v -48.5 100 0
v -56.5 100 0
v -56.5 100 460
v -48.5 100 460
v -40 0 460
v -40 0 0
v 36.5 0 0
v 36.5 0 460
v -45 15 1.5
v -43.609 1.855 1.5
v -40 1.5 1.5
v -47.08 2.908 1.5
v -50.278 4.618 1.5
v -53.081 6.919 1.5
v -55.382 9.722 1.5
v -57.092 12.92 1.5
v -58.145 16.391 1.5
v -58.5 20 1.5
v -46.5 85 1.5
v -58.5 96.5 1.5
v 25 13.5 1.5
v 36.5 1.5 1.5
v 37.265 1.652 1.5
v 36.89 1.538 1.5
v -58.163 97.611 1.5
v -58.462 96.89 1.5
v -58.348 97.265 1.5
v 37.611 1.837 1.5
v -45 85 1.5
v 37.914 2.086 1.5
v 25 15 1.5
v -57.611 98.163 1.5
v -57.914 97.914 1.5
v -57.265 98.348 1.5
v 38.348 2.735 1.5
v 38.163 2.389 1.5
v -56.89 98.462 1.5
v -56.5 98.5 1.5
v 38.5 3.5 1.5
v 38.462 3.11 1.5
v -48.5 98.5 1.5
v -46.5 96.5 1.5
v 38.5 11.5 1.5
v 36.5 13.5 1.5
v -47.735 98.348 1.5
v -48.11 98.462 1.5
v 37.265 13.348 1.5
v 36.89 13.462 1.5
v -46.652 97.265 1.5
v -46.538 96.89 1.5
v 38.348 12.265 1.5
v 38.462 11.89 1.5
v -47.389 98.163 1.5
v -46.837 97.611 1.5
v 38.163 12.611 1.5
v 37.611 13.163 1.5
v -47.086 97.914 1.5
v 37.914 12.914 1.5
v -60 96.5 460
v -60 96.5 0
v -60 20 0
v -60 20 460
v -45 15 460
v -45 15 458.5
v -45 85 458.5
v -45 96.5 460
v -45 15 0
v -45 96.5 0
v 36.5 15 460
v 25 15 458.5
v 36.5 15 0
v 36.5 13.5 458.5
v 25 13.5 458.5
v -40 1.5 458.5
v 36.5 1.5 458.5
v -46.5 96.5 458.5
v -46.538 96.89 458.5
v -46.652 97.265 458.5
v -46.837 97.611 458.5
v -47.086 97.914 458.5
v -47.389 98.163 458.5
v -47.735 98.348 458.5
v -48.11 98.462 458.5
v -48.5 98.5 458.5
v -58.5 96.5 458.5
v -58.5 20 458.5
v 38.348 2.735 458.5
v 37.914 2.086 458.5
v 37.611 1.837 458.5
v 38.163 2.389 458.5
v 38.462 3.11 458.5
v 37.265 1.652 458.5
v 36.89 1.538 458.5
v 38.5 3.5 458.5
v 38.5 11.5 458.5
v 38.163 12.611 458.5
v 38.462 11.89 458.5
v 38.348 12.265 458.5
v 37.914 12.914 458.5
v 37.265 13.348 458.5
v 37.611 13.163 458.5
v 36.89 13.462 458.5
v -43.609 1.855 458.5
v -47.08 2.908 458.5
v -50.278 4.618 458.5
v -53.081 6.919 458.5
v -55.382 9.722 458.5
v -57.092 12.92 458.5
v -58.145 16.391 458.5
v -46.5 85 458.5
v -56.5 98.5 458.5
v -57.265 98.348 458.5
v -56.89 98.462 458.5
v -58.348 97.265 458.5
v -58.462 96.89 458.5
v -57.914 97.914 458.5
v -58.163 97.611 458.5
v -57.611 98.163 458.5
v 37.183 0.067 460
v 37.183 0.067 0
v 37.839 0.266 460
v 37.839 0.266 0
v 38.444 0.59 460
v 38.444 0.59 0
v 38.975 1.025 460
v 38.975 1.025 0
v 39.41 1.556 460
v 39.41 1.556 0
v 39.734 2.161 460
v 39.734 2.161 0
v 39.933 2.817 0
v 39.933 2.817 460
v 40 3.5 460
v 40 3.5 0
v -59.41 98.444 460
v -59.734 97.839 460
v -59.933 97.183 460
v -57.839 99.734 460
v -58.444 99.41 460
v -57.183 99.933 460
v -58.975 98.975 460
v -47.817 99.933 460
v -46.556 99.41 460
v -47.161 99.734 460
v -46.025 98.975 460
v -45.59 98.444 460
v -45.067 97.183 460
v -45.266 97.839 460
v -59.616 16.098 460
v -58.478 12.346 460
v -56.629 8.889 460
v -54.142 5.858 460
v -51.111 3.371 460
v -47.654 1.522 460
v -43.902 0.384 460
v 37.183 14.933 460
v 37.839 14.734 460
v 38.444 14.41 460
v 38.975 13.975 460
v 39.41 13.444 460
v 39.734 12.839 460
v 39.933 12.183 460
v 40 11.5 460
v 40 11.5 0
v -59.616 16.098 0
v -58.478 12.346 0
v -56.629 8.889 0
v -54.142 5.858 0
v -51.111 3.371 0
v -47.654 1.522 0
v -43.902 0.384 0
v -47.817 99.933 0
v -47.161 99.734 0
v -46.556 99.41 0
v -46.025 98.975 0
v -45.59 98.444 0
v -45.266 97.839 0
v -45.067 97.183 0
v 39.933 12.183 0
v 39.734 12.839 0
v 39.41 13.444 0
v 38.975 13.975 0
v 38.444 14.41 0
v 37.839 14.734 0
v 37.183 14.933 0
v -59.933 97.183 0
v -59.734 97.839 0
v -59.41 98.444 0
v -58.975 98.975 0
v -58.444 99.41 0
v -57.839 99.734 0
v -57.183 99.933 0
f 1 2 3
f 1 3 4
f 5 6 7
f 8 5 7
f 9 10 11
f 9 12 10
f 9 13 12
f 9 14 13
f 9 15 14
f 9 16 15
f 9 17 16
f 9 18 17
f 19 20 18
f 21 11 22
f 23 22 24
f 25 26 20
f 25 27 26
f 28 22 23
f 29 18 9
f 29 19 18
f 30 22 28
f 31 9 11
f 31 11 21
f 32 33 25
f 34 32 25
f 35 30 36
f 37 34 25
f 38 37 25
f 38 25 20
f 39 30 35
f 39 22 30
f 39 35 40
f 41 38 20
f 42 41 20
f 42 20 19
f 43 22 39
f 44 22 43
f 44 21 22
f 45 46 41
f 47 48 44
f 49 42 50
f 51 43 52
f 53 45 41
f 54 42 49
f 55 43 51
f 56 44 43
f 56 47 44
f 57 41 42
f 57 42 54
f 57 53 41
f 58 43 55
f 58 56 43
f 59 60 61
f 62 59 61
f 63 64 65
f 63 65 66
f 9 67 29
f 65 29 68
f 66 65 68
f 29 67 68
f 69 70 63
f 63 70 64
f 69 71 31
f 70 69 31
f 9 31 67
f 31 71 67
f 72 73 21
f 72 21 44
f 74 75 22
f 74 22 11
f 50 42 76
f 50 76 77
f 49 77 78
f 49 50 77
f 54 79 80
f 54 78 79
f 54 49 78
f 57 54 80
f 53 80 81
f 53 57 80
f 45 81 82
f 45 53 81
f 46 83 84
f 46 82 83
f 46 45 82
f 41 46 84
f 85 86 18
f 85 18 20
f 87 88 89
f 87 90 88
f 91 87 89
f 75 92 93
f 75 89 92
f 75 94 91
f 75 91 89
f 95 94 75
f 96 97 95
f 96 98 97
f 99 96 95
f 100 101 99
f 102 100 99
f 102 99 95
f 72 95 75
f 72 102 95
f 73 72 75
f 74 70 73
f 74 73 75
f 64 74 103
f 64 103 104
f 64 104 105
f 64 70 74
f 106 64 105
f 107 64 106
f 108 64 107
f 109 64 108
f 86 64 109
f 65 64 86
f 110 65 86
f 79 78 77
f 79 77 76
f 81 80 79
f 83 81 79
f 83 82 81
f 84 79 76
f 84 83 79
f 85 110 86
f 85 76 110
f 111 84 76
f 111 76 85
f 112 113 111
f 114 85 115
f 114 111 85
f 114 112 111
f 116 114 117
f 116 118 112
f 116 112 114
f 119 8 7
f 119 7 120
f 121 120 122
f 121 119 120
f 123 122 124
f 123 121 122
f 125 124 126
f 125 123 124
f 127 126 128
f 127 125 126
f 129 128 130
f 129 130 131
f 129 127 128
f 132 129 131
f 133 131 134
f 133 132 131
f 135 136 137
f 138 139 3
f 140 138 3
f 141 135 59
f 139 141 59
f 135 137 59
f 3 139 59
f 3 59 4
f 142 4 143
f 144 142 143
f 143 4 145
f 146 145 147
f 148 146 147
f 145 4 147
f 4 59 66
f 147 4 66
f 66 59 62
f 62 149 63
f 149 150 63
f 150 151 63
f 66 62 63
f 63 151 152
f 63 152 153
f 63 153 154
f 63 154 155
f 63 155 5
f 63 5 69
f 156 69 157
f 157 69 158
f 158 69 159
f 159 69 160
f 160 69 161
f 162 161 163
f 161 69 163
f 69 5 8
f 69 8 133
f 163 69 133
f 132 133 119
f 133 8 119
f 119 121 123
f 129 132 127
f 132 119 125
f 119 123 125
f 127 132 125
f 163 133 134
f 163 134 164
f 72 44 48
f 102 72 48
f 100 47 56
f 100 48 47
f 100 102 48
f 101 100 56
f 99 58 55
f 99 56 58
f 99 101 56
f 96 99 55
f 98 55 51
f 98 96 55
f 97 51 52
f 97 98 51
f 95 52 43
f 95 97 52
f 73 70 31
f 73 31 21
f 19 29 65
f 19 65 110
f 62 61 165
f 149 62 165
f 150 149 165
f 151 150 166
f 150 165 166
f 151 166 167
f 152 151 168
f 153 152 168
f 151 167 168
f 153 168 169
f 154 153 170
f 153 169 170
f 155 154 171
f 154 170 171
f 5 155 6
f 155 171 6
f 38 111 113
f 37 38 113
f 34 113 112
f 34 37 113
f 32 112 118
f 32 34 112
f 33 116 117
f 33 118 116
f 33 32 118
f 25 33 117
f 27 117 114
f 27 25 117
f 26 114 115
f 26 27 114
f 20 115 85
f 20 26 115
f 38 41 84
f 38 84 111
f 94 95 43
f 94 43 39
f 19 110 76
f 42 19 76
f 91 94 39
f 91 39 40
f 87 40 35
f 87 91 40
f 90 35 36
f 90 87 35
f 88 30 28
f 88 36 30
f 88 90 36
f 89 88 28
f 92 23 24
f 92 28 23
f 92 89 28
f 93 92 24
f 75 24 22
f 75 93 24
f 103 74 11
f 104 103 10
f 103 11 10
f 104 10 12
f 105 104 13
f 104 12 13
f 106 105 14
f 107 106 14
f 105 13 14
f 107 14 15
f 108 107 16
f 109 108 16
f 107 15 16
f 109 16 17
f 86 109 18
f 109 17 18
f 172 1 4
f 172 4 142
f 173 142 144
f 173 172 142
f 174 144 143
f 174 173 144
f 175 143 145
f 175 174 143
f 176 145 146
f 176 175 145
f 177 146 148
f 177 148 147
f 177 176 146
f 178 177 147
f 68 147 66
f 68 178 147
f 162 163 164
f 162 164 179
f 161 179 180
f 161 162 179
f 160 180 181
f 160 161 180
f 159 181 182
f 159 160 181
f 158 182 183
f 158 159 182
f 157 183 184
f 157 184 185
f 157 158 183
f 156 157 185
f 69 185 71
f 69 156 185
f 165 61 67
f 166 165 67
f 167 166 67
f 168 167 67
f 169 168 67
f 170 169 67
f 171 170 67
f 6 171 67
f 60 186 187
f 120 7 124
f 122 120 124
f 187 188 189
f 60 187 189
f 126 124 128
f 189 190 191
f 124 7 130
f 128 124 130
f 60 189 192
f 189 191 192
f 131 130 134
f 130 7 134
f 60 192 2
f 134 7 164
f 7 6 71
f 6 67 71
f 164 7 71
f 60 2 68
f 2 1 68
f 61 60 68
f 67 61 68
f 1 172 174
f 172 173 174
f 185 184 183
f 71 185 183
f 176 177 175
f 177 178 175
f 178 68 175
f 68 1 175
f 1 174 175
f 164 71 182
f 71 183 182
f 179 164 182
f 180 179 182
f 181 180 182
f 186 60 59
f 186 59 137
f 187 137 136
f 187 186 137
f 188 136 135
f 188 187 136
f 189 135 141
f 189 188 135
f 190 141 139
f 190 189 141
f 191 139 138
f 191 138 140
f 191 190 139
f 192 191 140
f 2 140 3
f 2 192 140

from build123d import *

# Parameters (mm, degrees)
SM_BASE_FLANGE_1_DEPTH             = 460
SM_EDGE_FLANGE_1_STRIP_W           = 10
SM_EDGE_FLANGE_1_STRIP_H           = 1.5
SM_EDGE_FLANGE_1_STRIP_CUT_DEPTH   = 460
SM_EDGE_FLANGE_1_STRIP_2_W         = 10
SM_EDGE_FLANGE_1_STRIP_2_H         = 1.5
SM_EDGE_FLANGE_1_STRIP_CUT_2_DEPTH = 460
SM_EDGE_FLANGE_1_DEPTH             = 460
SM_EDGE_FLANGE_1_BEND_DEPTH        = 460
SM_EDGE_FLANGE_2_STRIP_W           = 10
SM_EDGE_FLANGE_2_STRIP_H           = 1.5
SM_EDGE_FLANGE_2_STRIP_CUT_DEPTH   = 460
SM_EDGE_FLANGE_2_STRIP_2_W         = 10
SM_EDGE_FLANGE_2_STRIP_2_H         = 1.5
SM_EDGE_FLANGE_2_STRIP_CUT_2_DEPTH = 460
SM_EDGE_FLANGE_2_DEPTH             = 460
SM_EDGE_FLANGE_2_BEND_DEPTH        = 460
EXTRUDE_START                      = -1.5
EXTRUDE_1_DEPTH                    = 1.5
EXTRUDE_2_DEPTH                    = 1.5


# Sheet-metal steps are written as plain solids
with BuildPart() as part:
    # 草图1 → 基体-法兰1 (new body)
    with BuildSketch(Plane.XY):
        with BuildLine():
            Line((-60, 100), (-60, 20))
            ThreePointArc((-60, 20), (-54.142135624, 5.857864376), (-40, 0))
            Line((-40, 0), (40, 0))
            Line((40, 0), (40, 1.5))
            Line((40, 1.5), (-40, 1.5))
            ThreePointArc((-40, 1.5), (-53.081475452, 6.918524548), (-58.5, 20))
            Line((-58.5, 20), (-58.5, 100))
            Line((-58.5, 100), (-60, 100))
        make_face()
    extrude(amount=SM_BASE_FLANGE_1_DEPTH)

    # 边线-法兰1 strip (across the edge) → 边线-法兰1 strip cut (cut)
    with BuildSketch(Plane(origin=(40, 1.5, 460), x_dir=(-1, 0, 0), z_dir=(0, 0, -1))):
        with Locations((-1.5, -0.75)):
            Rectangle(SM_EDGE_FLANGE_1_STRIP_W, SM_EDGE_FLANGE_1_STRIP_H)
    extrude(amount=SM_EDGE_FLANGE_1_STRIP_CUT_DEPTH, mode=Mode.SUBTRACT)

    # 边线-法兰1 strip 2 (across the edge) → 边线-法兰1 strip cut 2 (cut)
    with BuildSketch(Plane(origin=(-58.5, 100, 0), x_dir=(0, -1, 0), z_dir=(0, 0, 1))):
        with Locations((-1.5, -0.75)):
            Rectangle(SM_EDGE_FLANGE_1_STRIP_2_W, SM_EDGE_FLANGE_1_STRIP_2_H)
    extrude(amount=SM_EDGE_FLANGE_1_STRIP_CUT_2_DEPTH, mode=Mode.SUBTRACT)

    # 边线-法兰1 section (across the edge) → 边线-法兰1 (add)
    with BuildSketch(Plane(origin=(40, 1.5, 460), x_dir=(-1, 0, 0), z_dir=(0, 0, -1))):
        with BuildLine():
            Line((0, 2), (0, 13.5))
            Line((0, 13.5), (1.5, 13.5))
            Line((1.5, 13.5), (1.5, 2))
            ThreePointArc((1.5, 2), (2.085786438, 0.585786438), (3.5, 0))
            Line((3.5, 0), (3.5, -1.5))
            ThreePointArc((3.5, -1.5), (1.025126266, -0.474873734), (0, 2))
        make_face()
    extrude(amount=SM_EDGE_FLANGE_1_DEPTH)

    # 边线-法兰1 section 2 (across the edge) → 边线-法兰1 bend (add)
    with BuildSketch(Plane(origin=(-58.5, 100, 0), x_dir=(0, -1, 0), z_dir=(0, 0, 1))):
        with BuildLine():
            Line((0, 2), (0, 13.5))
            Line((0, 13.5), (1.5, 13.5))
            Line((1.5, 13.5), (1.5, 2))
            ThreePointArc((1.5, 2), (2.085786438, 0.585786438), (3.5, 0))
            Line((3.5, 0), (3.5, -1.5))
            ThreePointArc((3.5, -1.5), (1.025126266, -0.474873734), (0, 2))
        make_face()
    extrude(amount=SM_EDGE_FLANGE_1_BEND_DEPTH)

    # 边线-法兰2 strip (across the edge) → 边线-法兰2 strip cut (cut)
    with BuildSketch(Plane(origin=(38.5, 15, 460), x_dir=(0, -1, 0), z_dir=(0, 0, -1))):
        with Locations((-1.5, -0.75)):
            Rectangle(SM_EDGE_FLANGE_2_STRIP_W, SM_EDGE_FLANGE_2_STRIP_H)
    extrude(amount=SM_EDGE_FLANGE_2_STRIP_CUT_DEPTH, mode=Mode.SUBTRACT)

    # 边线-法兰2 strip 2 (across the edge) → 边线-法兰2 strip cut 2 (cut)
    with BuildSketch(Plane(origin=(-45, 98.5, 0), x_dir=(-1, 0, 0), z_dir=(0, 0, 1))):
        with Locations((-1.5, -0.75)):
            Rectangle(SM_EDGE_FLANGE_2_STRIP_2_W, SM_EDGE_FLANGE_2_STRIP_2_H)
    extrude(amount=SM_EDGE_FLANGE_2_STRIP_CUT_2_DEPTH, mode=Mode.SUBTRACT)

    # 边线-法兰2 section (across the edge) → 边线-法兰2 (add)
    with BuildSketch(Plane(origin=(38.5, 15, 460), x_dir=(0, -1, 0), z_dir=(0, 0, -1))):
        with BuildLine():
            Line((0, 2), (0, 13.5))
            Line((0, 13.5), (1.5, 13.5))
            Line((1.5, 13.5), (1.5, 2))
            ThreePointArc((1.5, 2), (2.085786438, 0.585786438), (3.5, 0))
            Line((3.5, 0), (3.5, -1.5))
            ThreePointArc((3.5, -1.5), (1.025126266, -0.474873734), (0, 2))
        make_face()
    extrude(amount=SM_EDGE_FLANGE_2_DEPTH)

    # 边线-法兰2 section 2 (across the edge) → 边线-法兰2 bend (add)
    with BuildSketch(Plane(origin=(-45, 98.5, 0), x_dir=(-1, 0, 0), z_dir=(0, 0, 1))):
        with BuildLine():
            Line((0, 2), (0, 13.5))
            Line((0, 13.5), (1.5, 13.5))
            Line((1.5, 13.5), (1.5, 2))
            ThreePointArc((1.5, 2), (2.085786438, 0.585786438), (3.5, 0))
            Line((3.5, 0), (3.5, -1.5))
            ThreePointArc((3.5, -1.5), (1.025126266, -0.474873734), (0, 2))
        make_face()
    extrude(amount=SM_EDGE_FLANGE_2_BEND_DEPTH)

    # 草图22 → 凸台-拉伸1 (add)
    with BuildSketch(Plane.XY.offset(460).offset(EXTRUDE_START)):
        with BuildLine():
            Line((-45, 96.5), (-45, 85))
            Line((-45, 85), (-45, 15))
            Line((-45, 15), (25, 15))
            Line((25, 15), (36.5, 15))
            ThreePointArc((36.5, 15), (38.974873734, 13.974873734), (40, 11.5))
            Line((40, 11.5), (40, 3.5))
            ThreePointArc((40, 3.5), (38.974873734, 1.025126266), (36.5, 0))
            Line((36.5, 0), (-40, 0))
            ThreePointArc((-40, 0), (-54.142135624, 5.857864376), (-60, 20))
            Line((-60, 20), (-60, 96.5))
            ThreePointArc((-60, 96.5), (-58.974873734, 98.974873734), (-56.5, 100))
            Line((-56.5, 100), (-48.5, 100))
            ThreePointArc((-48.5, 100), (-46.025126266, 98.974873734), (-45, 96.5))
        make_face()
    extrude(amount=EXTRUDE_1_DEPTH)

    # 草图23 → 凸台-拉伸2 (add)
    with BuildSketch(Plane(origin=(0, 0, 0), x_dir=(-1, 0, 0), z_dir=(0, 0, -1))):
        with BuildLine():
            Line((-25, 15), (45, 15))
            Line((45, 15), (45, 85))
            Line((45, 85), (45, 96.5))
            ThreePointArc((45, 96.5), (46.025126266, 98.974873734), (48.5, 100))
            Line((48.5, 100), (56.5, 100))
            ThreePointArc((56.5, 100), (58.974873734, 98.974873734), (60, 96.5))
            Line((60, 96.5), (60, 20))
            ThreePointArc((60, 20), (54.142135624, 5.857864376), (40, 0))
            Line((40, 0), (-36.5, 0))
            ThreePointArc((-36.5, 0), (-38.974873734, 1.025126266), (-40, 3.5))
            Line((-40, 3.5), (-40, 11.5))
            ThreePointArc((-40, 11.5), (-38.974873734, 13.974873734), (-36.5, 15))
            Line((-36.5, 15), (-25, 15))
        make_face()
    extrude(amount=-EXTRUDE_2_DEPTH)


solid = part.part
